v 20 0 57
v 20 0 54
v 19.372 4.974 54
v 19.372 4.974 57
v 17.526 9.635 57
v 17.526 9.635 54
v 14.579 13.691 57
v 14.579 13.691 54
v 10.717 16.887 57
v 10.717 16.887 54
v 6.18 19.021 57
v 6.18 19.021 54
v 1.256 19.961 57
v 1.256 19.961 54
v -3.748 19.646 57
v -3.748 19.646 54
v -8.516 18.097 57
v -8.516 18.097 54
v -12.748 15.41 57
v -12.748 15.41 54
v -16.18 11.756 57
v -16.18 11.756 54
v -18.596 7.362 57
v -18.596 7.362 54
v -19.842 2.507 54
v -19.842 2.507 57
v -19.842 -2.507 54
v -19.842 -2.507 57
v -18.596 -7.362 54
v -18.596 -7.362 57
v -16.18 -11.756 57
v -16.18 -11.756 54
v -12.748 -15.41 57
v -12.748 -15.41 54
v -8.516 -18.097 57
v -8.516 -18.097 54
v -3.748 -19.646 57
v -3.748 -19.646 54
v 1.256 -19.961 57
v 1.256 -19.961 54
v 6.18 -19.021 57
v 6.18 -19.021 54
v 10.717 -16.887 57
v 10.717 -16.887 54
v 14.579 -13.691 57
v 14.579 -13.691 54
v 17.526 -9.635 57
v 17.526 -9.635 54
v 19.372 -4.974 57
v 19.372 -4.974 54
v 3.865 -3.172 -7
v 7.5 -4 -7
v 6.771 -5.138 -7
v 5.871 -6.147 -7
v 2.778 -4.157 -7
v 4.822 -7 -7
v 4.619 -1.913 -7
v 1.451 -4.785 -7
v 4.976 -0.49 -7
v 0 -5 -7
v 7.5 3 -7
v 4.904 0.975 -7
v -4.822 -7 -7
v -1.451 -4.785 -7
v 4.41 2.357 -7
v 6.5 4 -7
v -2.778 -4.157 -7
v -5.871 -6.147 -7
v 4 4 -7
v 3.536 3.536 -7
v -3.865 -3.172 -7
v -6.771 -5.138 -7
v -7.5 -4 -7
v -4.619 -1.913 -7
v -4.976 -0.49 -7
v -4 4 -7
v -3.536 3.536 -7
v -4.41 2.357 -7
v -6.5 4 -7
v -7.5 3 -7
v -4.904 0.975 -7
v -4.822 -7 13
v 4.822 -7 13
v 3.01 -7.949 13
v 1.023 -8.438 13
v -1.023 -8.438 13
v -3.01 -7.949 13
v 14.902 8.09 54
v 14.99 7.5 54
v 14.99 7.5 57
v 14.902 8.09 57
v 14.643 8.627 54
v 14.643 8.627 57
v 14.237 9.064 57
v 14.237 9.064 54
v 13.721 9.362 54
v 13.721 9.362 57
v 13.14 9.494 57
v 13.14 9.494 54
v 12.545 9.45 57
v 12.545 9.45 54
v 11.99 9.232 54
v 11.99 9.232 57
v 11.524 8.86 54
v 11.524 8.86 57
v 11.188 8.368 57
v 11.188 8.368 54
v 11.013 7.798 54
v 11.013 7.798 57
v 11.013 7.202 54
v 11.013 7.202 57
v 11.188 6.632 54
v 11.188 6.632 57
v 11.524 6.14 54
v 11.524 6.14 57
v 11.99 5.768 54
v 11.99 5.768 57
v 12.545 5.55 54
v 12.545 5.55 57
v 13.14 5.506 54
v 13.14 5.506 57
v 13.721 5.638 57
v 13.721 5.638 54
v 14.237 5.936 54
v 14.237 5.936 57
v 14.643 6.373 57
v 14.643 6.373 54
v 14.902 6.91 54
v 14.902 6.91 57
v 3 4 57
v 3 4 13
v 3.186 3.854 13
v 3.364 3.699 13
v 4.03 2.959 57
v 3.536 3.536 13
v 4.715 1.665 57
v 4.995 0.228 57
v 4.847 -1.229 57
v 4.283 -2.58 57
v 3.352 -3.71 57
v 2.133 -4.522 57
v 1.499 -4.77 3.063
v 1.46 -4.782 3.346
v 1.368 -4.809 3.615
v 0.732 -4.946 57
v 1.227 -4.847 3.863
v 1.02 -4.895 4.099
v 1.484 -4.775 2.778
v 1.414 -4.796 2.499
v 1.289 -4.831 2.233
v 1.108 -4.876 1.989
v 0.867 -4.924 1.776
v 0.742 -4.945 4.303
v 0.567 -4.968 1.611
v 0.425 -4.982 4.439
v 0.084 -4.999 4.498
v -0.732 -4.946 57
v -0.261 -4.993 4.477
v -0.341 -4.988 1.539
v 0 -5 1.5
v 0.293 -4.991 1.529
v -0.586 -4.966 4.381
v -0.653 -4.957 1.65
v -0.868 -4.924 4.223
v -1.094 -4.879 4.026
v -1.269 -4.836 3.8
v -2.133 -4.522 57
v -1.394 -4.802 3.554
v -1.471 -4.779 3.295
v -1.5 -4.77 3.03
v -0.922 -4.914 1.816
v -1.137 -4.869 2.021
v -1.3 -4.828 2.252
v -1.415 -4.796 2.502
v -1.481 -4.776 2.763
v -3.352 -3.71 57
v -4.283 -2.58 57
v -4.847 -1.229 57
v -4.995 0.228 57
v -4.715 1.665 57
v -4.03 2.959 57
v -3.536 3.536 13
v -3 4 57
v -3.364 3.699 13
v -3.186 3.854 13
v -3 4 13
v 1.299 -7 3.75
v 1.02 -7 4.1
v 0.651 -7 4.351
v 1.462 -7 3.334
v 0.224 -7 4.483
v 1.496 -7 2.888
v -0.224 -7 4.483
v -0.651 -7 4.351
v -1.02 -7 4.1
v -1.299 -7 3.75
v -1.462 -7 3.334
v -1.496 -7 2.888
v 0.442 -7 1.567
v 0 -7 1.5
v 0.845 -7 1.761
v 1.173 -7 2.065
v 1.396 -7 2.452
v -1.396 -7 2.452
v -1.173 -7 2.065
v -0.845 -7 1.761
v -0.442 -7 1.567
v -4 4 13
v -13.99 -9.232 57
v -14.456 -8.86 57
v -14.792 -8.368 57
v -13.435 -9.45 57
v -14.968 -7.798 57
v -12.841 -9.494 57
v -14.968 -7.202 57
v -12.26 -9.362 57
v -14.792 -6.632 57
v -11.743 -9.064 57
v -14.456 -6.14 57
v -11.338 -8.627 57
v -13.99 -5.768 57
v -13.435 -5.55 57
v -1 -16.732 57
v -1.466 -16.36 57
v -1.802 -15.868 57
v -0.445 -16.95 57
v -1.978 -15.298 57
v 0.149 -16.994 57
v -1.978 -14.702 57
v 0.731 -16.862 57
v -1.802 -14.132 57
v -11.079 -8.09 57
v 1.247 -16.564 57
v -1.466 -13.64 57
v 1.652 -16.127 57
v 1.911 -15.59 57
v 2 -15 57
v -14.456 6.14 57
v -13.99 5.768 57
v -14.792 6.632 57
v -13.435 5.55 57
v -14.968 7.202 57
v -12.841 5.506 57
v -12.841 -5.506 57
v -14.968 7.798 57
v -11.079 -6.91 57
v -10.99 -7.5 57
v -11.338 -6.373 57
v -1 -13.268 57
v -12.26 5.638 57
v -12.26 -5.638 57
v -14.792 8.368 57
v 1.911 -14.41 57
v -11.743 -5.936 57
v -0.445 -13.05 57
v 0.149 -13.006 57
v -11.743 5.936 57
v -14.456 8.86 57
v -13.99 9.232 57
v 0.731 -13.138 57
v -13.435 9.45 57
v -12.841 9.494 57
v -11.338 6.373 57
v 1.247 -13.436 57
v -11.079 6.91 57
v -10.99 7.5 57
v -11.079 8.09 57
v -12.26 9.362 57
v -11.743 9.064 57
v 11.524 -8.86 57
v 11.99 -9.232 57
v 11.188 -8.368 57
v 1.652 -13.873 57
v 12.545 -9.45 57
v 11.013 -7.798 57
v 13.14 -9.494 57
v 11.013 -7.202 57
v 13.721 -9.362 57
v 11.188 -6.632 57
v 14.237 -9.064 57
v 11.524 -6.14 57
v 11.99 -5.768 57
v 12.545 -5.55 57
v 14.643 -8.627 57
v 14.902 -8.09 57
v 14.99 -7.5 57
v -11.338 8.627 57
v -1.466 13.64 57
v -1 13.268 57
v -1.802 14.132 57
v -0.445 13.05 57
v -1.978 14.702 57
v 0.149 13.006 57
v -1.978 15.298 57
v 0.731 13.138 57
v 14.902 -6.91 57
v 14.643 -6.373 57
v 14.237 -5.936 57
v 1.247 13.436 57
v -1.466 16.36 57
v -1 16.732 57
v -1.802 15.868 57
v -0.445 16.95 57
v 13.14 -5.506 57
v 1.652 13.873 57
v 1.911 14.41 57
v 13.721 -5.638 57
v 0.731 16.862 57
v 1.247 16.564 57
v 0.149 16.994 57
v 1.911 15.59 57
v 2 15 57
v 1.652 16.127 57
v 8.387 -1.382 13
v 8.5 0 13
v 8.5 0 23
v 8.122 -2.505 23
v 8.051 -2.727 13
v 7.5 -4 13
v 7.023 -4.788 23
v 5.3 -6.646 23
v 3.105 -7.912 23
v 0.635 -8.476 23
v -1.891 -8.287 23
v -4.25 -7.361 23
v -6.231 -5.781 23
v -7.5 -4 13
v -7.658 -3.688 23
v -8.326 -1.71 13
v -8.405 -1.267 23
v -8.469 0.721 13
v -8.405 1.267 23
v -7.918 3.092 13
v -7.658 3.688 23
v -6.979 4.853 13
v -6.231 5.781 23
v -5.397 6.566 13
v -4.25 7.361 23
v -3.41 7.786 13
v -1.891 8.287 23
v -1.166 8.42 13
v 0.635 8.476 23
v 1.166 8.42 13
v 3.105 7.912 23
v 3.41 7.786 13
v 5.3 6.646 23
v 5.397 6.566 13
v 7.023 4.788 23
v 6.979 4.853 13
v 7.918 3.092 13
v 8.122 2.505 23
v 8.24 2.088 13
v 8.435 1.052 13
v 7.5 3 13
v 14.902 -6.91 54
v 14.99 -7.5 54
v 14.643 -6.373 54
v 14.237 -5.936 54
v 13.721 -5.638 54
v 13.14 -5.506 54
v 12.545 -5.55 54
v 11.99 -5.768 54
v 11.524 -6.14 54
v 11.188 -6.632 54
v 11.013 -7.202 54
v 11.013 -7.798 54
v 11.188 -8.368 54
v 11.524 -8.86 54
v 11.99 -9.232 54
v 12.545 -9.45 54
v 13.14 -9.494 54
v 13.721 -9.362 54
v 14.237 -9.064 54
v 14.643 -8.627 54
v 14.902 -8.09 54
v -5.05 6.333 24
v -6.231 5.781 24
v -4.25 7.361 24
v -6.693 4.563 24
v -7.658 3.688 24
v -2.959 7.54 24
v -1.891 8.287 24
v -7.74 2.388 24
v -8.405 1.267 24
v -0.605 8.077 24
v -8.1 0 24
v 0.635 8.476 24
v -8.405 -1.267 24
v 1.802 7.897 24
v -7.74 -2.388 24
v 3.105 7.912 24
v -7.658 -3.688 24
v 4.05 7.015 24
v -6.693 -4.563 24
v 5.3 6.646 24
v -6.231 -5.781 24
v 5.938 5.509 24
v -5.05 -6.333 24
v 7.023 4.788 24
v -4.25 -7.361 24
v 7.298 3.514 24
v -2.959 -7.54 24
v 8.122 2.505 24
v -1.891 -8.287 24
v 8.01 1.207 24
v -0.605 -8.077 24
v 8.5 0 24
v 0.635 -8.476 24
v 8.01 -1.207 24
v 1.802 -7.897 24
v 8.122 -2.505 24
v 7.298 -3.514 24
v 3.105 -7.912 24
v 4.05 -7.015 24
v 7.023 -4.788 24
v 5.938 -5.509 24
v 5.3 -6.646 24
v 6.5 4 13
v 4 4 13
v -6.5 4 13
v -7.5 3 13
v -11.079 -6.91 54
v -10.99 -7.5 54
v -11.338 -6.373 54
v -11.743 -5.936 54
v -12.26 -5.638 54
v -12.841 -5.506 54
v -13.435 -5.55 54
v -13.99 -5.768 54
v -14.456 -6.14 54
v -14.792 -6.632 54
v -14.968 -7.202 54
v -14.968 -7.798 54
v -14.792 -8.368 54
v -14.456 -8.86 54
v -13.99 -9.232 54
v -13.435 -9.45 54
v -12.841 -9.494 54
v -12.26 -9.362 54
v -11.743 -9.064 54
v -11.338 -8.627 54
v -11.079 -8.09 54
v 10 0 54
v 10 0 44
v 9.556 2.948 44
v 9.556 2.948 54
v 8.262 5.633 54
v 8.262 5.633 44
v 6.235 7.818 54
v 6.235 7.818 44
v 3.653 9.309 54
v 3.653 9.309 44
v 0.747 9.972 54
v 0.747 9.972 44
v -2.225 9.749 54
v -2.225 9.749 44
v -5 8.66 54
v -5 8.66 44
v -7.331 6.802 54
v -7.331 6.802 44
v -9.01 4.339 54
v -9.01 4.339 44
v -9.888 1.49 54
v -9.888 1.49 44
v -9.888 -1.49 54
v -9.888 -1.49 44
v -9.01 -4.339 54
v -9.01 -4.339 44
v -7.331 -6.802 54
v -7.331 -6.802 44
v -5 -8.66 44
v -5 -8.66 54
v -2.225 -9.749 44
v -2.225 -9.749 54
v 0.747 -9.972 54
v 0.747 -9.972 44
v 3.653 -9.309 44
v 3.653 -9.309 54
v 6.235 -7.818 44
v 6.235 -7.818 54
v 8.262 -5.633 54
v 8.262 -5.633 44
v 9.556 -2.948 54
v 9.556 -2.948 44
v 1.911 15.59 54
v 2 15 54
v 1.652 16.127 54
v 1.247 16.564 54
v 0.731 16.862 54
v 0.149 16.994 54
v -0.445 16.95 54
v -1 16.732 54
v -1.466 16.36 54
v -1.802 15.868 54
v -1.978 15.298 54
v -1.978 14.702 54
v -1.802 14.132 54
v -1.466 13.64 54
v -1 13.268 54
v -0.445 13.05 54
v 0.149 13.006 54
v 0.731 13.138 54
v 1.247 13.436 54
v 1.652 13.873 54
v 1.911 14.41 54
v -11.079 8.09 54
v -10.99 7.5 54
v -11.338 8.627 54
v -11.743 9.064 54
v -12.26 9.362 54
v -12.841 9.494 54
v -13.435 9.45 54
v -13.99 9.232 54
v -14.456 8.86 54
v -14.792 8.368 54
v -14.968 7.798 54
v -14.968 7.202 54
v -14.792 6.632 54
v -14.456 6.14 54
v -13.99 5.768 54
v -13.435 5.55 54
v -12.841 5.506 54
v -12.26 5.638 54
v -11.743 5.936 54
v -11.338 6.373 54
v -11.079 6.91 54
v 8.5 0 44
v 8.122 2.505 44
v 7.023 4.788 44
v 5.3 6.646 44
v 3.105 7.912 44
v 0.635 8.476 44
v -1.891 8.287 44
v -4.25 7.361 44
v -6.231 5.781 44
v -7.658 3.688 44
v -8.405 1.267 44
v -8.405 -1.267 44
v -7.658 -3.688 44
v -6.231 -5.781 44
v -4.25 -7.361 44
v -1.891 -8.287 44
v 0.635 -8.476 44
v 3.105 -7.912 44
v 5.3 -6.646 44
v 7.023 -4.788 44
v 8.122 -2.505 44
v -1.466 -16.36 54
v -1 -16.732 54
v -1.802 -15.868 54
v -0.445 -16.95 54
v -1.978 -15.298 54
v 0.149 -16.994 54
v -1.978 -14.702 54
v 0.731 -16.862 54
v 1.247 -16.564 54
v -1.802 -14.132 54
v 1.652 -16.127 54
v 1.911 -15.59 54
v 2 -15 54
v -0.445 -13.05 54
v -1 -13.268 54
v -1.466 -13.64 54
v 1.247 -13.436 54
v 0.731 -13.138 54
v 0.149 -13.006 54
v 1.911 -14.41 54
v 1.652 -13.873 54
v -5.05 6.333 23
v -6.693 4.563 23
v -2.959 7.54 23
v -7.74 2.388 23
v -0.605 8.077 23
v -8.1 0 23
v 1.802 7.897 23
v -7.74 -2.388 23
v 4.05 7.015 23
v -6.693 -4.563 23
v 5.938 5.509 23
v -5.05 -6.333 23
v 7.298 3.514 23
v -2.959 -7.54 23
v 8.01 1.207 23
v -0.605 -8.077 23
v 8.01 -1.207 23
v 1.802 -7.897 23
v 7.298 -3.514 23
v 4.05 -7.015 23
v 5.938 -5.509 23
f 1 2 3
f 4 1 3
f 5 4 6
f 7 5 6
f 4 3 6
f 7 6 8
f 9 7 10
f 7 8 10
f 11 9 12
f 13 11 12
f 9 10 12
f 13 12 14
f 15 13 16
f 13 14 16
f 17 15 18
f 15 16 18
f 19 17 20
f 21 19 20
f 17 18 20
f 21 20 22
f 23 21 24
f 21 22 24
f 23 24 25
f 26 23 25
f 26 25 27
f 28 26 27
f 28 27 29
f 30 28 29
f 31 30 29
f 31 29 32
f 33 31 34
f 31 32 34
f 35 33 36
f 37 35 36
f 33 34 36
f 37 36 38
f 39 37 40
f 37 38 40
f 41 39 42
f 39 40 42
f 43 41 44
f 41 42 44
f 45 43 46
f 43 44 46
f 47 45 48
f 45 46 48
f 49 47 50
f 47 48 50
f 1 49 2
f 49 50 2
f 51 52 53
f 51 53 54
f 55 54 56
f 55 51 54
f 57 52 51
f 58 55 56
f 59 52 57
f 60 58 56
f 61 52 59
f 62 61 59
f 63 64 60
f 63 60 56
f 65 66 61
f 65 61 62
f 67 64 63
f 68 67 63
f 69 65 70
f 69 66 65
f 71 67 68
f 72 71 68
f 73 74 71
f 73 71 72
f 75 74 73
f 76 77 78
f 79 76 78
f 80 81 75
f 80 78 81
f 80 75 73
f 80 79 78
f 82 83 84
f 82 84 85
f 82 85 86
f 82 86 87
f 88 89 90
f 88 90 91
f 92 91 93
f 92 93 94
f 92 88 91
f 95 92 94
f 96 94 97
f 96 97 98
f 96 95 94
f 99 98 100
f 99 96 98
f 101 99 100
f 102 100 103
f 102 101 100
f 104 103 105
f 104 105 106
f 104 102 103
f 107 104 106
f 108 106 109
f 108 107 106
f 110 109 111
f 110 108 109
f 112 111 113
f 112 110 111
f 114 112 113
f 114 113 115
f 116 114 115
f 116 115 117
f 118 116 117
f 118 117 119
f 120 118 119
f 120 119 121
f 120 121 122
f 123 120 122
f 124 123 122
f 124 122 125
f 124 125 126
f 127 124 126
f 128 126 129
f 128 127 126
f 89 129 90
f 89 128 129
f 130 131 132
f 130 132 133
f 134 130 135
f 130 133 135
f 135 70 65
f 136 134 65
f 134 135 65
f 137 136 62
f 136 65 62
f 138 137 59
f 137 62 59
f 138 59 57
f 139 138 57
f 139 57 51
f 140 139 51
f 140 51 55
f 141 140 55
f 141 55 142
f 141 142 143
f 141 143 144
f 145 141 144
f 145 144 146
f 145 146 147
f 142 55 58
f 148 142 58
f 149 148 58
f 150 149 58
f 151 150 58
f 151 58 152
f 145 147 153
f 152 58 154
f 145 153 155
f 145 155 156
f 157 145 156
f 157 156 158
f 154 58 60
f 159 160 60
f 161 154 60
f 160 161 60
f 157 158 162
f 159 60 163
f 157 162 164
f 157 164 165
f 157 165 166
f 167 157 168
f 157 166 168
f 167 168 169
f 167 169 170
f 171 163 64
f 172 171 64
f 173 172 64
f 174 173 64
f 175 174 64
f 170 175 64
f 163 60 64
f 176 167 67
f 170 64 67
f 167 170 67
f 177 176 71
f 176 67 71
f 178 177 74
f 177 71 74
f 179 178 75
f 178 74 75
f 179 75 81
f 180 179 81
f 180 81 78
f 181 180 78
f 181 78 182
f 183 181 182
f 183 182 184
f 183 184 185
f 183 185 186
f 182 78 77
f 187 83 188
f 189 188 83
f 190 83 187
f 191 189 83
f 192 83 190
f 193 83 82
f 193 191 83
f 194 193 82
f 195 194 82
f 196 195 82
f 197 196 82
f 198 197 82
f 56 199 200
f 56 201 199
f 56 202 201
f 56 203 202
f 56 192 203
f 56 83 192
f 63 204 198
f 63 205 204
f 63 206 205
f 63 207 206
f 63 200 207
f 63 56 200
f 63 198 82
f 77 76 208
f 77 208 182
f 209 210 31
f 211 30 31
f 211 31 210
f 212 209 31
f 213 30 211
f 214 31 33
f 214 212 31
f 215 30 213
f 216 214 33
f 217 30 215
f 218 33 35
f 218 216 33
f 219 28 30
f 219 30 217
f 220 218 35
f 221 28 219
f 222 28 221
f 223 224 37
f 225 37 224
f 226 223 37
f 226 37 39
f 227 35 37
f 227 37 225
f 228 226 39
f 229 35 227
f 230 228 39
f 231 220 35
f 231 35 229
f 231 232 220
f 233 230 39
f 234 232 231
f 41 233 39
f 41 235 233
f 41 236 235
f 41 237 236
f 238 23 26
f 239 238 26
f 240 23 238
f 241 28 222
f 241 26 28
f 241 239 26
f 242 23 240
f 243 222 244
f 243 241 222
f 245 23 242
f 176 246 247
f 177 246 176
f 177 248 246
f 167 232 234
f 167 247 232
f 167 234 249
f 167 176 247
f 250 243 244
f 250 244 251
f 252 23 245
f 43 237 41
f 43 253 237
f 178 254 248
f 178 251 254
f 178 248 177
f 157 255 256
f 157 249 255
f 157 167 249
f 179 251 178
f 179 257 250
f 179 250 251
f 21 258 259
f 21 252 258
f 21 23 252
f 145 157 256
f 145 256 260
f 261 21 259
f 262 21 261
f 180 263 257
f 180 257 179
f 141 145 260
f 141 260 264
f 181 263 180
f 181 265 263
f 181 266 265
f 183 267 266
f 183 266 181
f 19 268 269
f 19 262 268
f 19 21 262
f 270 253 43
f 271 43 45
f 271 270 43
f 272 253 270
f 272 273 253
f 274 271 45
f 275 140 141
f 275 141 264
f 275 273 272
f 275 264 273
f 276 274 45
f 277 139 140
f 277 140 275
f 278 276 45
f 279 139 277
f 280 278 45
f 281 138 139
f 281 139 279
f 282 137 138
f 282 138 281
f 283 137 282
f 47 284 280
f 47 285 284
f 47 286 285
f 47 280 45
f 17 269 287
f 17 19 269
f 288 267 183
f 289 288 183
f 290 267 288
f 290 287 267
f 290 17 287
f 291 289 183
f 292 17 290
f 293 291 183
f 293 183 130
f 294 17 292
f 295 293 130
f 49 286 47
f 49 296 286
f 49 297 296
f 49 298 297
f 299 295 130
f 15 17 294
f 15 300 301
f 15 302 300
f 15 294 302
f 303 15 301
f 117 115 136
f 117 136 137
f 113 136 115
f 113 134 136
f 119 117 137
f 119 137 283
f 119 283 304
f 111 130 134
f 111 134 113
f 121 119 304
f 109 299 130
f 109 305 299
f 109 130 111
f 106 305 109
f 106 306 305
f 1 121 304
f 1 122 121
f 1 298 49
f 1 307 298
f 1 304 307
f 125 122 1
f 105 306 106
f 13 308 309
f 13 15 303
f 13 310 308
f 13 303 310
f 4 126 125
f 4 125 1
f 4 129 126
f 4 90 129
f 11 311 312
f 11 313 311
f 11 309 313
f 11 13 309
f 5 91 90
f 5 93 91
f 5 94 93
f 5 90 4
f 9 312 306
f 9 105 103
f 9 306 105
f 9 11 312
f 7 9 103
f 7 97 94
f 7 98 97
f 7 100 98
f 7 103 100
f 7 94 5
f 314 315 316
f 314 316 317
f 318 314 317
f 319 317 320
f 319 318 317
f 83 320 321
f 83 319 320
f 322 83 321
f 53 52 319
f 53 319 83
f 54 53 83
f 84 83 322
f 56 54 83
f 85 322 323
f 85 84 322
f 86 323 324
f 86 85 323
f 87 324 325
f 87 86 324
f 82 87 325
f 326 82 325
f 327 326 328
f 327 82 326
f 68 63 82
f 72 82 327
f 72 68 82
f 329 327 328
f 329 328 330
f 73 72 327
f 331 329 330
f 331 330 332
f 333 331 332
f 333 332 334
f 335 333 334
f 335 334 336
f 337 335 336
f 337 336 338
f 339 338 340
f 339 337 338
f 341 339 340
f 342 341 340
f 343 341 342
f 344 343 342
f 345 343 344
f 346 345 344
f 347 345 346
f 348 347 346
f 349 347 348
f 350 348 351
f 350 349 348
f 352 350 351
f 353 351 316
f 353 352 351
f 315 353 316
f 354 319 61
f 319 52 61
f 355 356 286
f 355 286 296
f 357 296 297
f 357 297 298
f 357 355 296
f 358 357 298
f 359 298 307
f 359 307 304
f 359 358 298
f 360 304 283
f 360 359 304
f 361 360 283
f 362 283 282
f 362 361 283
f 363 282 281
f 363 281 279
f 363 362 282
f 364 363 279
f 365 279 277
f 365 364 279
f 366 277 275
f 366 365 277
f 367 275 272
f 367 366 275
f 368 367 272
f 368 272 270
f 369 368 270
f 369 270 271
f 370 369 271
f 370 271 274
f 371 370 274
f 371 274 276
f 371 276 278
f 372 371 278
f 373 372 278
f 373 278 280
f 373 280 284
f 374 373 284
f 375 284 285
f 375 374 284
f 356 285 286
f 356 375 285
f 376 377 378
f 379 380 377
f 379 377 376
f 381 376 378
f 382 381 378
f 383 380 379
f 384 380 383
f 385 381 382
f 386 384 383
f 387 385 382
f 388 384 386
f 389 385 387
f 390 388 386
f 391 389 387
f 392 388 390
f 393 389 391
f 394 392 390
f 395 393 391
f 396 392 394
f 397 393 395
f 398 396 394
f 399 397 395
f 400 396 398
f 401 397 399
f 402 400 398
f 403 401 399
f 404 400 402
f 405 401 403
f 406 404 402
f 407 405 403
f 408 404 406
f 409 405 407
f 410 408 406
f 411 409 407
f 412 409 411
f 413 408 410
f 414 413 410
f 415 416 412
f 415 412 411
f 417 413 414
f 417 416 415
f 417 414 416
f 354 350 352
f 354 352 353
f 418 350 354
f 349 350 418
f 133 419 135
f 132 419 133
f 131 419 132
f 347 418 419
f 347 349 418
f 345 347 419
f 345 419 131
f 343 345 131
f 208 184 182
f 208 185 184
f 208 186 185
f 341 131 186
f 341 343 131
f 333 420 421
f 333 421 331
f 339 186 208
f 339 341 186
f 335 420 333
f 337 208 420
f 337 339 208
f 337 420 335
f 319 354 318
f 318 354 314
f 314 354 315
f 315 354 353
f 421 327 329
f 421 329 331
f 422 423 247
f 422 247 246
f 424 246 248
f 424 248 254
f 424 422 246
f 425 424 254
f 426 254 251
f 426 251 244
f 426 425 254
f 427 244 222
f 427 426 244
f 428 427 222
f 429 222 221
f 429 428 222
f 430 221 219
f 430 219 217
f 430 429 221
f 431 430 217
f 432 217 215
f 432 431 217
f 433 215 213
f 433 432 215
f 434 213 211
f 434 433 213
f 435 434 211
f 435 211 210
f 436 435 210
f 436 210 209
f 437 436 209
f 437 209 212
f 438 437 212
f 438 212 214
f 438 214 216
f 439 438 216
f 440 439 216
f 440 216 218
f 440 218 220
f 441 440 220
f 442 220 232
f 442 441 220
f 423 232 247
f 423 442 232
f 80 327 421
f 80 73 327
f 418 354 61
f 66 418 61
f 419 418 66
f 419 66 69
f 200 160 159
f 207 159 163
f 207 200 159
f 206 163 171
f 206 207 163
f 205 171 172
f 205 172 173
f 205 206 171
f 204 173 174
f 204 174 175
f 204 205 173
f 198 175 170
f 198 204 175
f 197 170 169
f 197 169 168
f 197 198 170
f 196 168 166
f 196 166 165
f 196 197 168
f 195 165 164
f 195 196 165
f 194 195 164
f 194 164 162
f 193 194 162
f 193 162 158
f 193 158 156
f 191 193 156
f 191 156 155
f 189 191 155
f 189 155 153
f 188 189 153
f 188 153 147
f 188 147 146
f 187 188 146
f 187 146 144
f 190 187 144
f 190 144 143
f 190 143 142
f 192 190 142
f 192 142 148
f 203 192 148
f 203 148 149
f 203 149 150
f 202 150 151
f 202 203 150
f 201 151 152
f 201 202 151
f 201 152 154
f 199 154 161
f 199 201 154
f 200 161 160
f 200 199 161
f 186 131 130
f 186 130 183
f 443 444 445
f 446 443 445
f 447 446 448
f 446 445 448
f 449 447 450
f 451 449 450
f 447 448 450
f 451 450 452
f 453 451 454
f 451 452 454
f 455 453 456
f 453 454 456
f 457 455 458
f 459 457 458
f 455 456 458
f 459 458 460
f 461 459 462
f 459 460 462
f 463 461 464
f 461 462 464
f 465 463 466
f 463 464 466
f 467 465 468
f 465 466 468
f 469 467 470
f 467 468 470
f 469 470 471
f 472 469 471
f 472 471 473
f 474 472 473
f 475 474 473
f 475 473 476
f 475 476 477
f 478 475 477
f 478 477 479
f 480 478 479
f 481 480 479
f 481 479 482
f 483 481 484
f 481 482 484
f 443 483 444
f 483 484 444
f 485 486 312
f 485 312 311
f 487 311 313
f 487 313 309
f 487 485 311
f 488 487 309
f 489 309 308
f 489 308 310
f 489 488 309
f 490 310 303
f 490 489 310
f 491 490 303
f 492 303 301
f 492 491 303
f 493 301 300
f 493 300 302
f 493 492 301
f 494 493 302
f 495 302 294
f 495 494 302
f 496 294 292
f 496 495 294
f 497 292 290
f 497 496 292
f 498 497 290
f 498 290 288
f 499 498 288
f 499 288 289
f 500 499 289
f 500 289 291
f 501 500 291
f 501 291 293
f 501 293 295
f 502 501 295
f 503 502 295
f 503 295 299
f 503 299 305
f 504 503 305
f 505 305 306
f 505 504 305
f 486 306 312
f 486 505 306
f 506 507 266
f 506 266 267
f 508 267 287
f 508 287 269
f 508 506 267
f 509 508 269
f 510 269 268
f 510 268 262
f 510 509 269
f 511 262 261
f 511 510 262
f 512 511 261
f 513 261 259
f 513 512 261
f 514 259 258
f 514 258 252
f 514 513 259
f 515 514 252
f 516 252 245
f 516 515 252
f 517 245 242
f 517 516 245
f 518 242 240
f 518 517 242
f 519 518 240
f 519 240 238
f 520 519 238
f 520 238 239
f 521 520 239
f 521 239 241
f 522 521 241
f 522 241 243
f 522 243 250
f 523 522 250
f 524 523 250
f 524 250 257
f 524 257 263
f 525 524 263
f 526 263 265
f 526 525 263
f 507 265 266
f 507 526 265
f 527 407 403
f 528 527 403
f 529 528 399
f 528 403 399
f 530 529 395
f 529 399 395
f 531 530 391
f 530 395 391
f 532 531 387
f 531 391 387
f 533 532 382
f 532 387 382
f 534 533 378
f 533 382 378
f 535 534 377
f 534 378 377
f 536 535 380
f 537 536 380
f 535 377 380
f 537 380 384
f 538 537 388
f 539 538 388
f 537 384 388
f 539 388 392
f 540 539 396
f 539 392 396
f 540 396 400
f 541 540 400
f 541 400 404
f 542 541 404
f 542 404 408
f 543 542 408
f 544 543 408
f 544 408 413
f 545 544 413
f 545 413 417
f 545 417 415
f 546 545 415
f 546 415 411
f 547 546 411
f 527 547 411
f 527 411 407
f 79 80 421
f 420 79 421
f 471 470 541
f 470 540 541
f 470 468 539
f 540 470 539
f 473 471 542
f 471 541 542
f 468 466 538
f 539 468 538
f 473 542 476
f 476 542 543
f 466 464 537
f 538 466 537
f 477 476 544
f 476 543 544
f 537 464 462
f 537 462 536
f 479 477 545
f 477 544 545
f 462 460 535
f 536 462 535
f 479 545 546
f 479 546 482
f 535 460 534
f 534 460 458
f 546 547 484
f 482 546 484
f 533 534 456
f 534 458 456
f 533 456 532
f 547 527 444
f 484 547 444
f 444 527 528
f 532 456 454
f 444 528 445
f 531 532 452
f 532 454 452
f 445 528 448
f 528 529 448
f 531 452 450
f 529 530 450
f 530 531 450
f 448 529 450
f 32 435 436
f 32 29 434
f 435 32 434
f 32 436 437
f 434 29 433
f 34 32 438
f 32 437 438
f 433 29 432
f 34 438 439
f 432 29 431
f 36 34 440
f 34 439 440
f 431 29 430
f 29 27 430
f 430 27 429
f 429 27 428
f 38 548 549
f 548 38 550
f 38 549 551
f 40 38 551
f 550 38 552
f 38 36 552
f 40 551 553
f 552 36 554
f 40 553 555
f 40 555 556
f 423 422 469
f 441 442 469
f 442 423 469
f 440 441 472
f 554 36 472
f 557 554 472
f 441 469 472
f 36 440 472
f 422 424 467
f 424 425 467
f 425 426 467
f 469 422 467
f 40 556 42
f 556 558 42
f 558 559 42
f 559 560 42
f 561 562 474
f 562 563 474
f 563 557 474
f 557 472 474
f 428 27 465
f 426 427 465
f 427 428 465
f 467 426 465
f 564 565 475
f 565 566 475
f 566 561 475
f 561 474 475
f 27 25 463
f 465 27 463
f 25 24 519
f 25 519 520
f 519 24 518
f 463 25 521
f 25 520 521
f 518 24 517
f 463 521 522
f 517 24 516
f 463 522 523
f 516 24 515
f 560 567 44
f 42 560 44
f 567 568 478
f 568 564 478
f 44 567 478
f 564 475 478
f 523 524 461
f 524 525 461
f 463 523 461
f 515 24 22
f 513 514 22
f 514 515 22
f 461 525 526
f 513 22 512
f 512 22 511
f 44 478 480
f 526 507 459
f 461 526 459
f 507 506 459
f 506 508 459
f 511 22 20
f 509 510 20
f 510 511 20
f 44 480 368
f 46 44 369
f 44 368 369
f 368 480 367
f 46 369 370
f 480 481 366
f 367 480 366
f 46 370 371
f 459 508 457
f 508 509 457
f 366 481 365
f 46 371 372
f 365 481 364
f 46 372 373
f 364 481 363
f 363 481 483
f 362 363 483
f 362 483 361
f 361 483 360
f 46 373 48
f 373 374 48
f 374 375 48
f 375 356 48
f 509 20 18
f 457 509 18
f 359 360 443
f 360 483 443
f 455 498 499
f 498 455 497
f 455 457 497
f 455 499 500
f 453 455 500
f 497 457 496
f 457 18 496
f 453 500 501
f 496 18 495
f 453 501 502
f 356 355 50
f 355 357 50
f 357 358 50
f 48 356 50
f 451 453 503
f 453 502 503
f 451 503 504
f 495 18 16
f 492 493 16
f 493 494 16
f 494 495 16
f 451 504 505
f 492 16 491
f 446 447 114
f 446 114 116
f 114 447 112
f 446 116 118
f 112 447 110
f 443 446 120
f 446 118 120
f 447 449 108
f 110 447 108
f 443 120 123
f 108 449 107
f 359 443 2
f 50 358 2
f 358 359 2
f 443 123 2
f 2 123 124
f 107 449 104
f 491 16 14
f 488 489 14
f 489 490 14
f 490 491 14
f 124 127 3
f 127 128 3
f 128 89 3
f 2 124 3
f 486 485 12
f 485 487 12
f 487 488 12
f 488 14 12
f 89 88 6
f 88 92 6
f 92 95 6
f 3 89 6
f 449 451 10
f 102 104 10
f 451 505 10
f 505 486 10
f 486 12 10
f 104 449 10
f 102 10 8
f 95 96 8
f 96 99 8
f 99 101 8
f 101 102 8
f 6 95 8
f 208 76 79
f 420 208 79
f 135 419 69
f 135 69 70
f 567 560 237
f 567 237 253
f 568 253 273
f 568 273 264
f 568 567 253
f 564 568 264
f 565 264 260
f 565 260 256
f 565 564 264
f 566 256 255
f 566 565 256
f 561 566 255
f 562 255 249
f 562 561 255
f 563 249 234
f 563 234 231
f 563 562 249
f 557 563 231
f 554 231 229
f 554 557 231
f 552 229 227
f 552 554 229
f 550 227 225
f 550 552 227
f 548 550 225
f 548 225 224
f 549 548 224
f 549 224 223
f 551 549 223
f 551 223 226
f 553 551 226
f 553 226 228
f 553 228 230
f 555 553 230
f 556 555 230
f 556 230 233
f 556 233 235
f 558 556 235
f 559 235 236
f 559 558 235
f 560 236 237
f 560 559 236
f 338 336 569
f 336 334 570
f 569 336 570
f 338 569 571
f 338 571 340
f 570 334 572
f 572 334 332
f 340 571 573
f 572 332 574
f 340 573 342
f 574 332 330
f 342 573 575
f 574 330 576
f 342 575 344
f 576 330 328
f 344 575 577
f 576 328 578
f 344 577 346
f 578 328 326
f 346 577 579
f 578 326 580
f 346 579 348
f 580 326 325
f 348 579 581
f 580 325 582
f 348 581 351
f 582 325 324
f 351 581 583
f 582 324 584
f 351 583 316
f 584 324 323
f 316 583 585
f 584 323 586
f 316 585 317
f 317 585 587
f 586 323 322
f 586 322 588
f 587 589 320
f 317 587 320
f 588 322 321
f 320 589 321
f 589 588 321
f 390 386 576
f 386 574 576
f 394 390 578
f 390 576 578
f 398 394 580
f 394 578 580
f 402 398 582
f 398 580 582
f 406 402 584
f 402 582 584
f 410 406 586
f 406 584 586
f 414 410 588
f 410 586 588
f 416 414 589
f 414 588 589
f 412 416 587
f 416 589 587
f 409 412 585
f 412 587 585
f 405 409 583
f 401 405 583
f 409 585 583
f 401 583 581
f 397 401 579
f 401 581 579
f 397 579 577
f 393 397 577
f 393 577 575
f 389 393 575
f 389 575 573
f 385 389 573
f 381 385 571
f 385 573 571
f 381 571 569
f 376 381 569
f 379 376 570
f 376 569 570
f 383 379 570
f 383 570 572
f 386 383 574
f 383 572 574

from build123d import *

# Parameters (mm, degrees)
SKETCH_1_R               = 8.5
EXTRUDE_1_DEPTH          = 33
SKETCH_2_R               = 8.5
EXTRUDE_2_DEPTH          = 11
SKETCH_3_R               = 10
EXTRUDE_3_DEPTH          = 10
CHAMFER_2_SIZE           = 0.5
SKETCH_12_W              = 1
SKETCH_12_H              = 0.4
SKETCH_13_R              = 5
CUT_EXTRUDE_1_DEPTH      = 20
EXTRUDE_START            = 7.5
SKETCH_19_R              = 8.5
EXTRUDE_6_DEPTH          = 7.5
SKETCH_20_R              = 5
CUT_EXTRUDE_5_DEPTH      = 7.5
CUT_EXTRUDE_6_DEPTH      = 16.5
CUT_EXTRUDE_6_DEPTH_BACK = 16.5
SKETCH_21_R              = 1.5
SKETCH_14_R              = 20
SKETCH_14_R_2            = 2
EXTRUDE_7_DEPTH          = 3
EXTRUDE_START_2          = 7
SKETCH_23_R              = 5
EXTRUDE_8_DEPTH          = 7
CUT_EXTRUDE_START        = -44
SKETCH_24_R              = 5
CUT_EXTRUDE_7_DEPTH      = 44
SKETCH_31_R              = 7
SKETCH_31_R_2            = 5
EXTRUDE_10_DEPTH         = 20
EXTRUDE_11_DEPTH         = 84
SKETCH_33_R              = 1.5
CUT_EXTRUDE_8_DEPTH      = 26
EXTRUDE_START_3          = -3
SKETCH_35_R              = 13
SKETCH_35_R_2            = 7
EXTRUDE_12_DEPTH         = 3
SKETCH_36_R              = 1.5
CUT_EXTRUDE_10_DEPTH     = 3
CUT_EXTRUDE_START_2      = -20
SKETCH_38_R              = 20
CUT_EXTRUDE_12_DEPTH     = 20
SKETCH_39_W              = 15
SKETCH_39_H              = 6.010679791
CUT_EXTRUDE_13_DEPTH     = 20
SKETCH_40_W              = 3.690554248
SKETCH_40_H              = 8
SKETCH_40_W_2            = 3.213479815
CUT_EXTRUDE_14_DEPTH     = 20
SKETCH_42_W              = 19.43068456
SKETCH_42_H              = 3.441553847
CUT_EXTRUDE_16_DEPTH     = 20
CHAMFER_5_SIZE           = 1
CHAMFER_6_SIZE           = 1


with BuildPart() as part:
    # 草图1 → 凸台-拉伸1 (new body)
    with BuildSketch(Plane.XY):
        Circle(SKETCH_1_R)
    extrude(amount=EXTRUDE_1_DEPTH)

    # 草图2 → 凸台-拉伸2 (add)
    with BuildSketch(Plane.XY.offset(33)):
        Circle(SKETCH_2_R)
    extrude(amount=EXTRUDE_2_DEPTH)

    # 草图3 → 凸台-拉伸3 (add)
    with BuildSketch(Plane.XY.offset(44)):
        Circle(SKETCH_3_R)
    extrude(amount=EXTRUDE_3_DEPTH)

    # 倒角2
    chamfer_2_edges = [part.edges().sort_by_distance(p)[0] for p in [
        (-8.5, 0, 0),
    ]]
    chamfer(chamfer_2_edges, length=CHAMFER_2_SIZE)

    # 草图12 → 切除-旋转1 (revolve, cut)
    with BuildSketch(Plane(origin=(0, 0, 0), x_dir=(0, 0, -1), z_dir=(1, 0, 0)), mode=Mode.PRIVATE) as cut_revolve_1_sk:
        with Locations((-23.5, 8.3)):
            Rectangle(SKETCH_12_W, SKETCH_12_H)
    revolve(cut_revolve_1_sk.sketch.rotate(Axis((0, 0, 0), (0, 0, 1)), 90), axis=Axis((0, 0, 0), (0, 0, 1)), mode=Mode.SUBTRACT)

    # 草图13 → 切除-拉伸1 (cut)
    with BuildSketch(Plane(origin=(0, 0, 0), x_dir=(-1, 0, 0), z_dir=(0, 0, -1))):
        Circle(SKETCH_13_R)
    extrude(amount=-CUT_EXTRUDE_1_DEPTH, mode=Mode.SUBTRACT)

    # 草图19 → 凸台-拉伸6 (add)
    with BuildSketch(Plane(origin=(0, 0, 0.5), x_dir=(-1, 0, 0), z_dir=(0, 0, -1)).offset(EXTRUDE_START)):
        Circle(SKETCH_19_R)
    extrude(amount=-EXTRUDE_6_DEPTH)

    # 草图20 → 切除-拉伸5 (cut)
    with BuildSketch(Plane(origin=(0, 0, -7), x_dir=(-1, 0, 0), z_dir=(0, 0, -1))):
        Circle(SKETCH_20_R)
    extrude(amount=-CUT_EXTRUDE_5_DEPTH, mode=Mode.SUBTRACT)

    # 草图21 → 切除-拉伸6 (cut, two sides: drawn at the far end of the back side and taken through both)
    with BuildSketch(Plane(origin=(0, 0, 0), x_dir=(1, 0, 0), z_dir=(0, 1, 0)).offset(-CUT_EXTRUDE_6_DEPTH_BACK)):
        with Locations(Location((0, -3, 0), (0, 0, 90))):
            Circle(SKETCH_21_R)
    extrude(amount=CUT_EXTRUDE_6_DEPTH + CUT_EXTRUDE_6_DEPTH_BACK, mode=Mode.SUBTRACT)

    # 草图14 → 凸台-拉伸7 (add)
    with BuildSketch(Plane.XY.offset(54)):
        Circle(SKETCH_14_R)
        with Locations((0, 15)):
            Circle(SKETCH_14_R_2, mode=Mode.SUBTRACT)
        with Locations((12.990381057, 7.5)):
            Circle(SKETCH_14_R_2, mode=Mode.SUBTRACT)
        with Locations((12.990381057, -7.5)):
            Circle(SKETCH_14_R_2, mode=Mode.SUBTRACT)
        with Locations((0, -15)):
            Circle(SKETCH_14_R_2, mode=Mode.SUBTRACT)
        with Locations((-12.990381057, -7.5)):
            Circle(SKETCH_14_R_2, mode=Mode.SUBTRACT)
        with Locations((-12.990381057, 7.5)):
            Circle(SKETCH_14_R_2, mode=Mode.SUBTRACT)
    extrude(amount=EXTRUDE_7_DEPTH)

    # 草图23 → 凸台-拉伸8 (add)
    with BuildSketch(Plane(origin=(0, 0, 20), x_dir=(-1, 0, 0), z_dir=(0, 0, -1)).offset(EXTRUDE_START_2)):
        Circle(SKETCH_23_R)
    extrude(amount=-EXTRUDE_8_DEPTH)

    # 草图24 → 切除-拉伸7 (cut)
    with BuildSketch(Plane.XY.offset(57).offset(CUT_EXTRUDE_START)):
        with Locations(Location((0, 0, 0), (0, 0, 180))):
            Circle(SKETCH_24_R)
    extrude(amount=CUT_EXTRUDE_7_DEPTH, mode=Mode.SUBTRACT)

    # 草图31 → 凸台-拉伸10 (add)
    with BuildSketch(Plane.XY.offset(57)):
        Circle(SKETCH_31_R)
        with Locations(Location((0, 0, 0), (0, 0, 180))):
            Circle(SKETCH_31_R_2, mode=Mode.SUBTRACT)
    extrude(amount=EXTRUDE_10_DEPTH)

    # 草图32 → 凸台-拉伸11 (add)
    with BuildSketch(Plane(origin=(0, 0, -7), x_dir=(-1, 0, 0), z_dir=(0, 0, -1))):
        with BuildLine():
            Line((-3, 4), (3, 4))
            ThreePointArc((3, 4), (0, 5), (-3, 4))
        make_face()
    extrude(amount=-EXTRUDE_11_DEPTH)

    # 草图33 → 切除-拉伸8 (cut)
    with BuildSketch(Plane.XZ.offset(-4)):
        with Locations(Location((0, 3, 0), (0, 0, 270))):
            Circle(SKETCH_33_R)
    extrude(amount=-CUT_EXTRUDE_8_DEPTH, mode=Mode.SUBTRACT)

    # 草图35 → 凸台-拉伸12 (add)
    with BuildSketch(Plane.XY.offset(74).offset(EXTRUDE_START_3)):
        Circle(SKETCH_35_R)
        Circle(SKETCH_35_R_2, mode=Mode.SUBTRACT)
    extrude(amount=EXTRUDE_12_DEPTH)

    # 草图36 → 切除-拉伸10 (cut)
    with BuildSketch(Plane.XY.offset(74)):
        with Locations((0, 10)):
            Circle(SKETCH_36_R)
        with Locations((8.660254038, 5)):
            Circle(SKETCH_36_R)
        with Locations((8.660254038, -5)):
            Circle(SKETCH_36_R)
        with Locations((0, -10)):
            Circle(SKETCH_36_R)
        with Locations((-8.660254038, -5)):
            Circle(SKETCH_36_R)
        with Locations((-8.660254038, 5)):
            Circle(SKETCH_36_R)
    extrude(amount=-CUT_EXTRUDE_10_DEPTH, mode=Mode.SUBTRACT)

    # 草图38 → 切除-拉伸12 (cut)
    with BuildSketch(Plane.XY.offset(77).offset(CUT_EXTRUDE_START_2)):
        Circle(SKETCH_38_R)
    extrude(amount=CUT_EXTRUDE_12_DEPTH, mode=Mode.SUBTRACT)

    # 草图39 → 切除-拉伸13 (cut)
    with BuildSketch(Plane(origin=(0, 0, -7), x_dir=(-1, 0, 0), z_dir=(0, 0, -1))):
        with Locations((0, 7.005339896)):
            Rectangle(SKETCH_39_W, SKETCH_39_H)
    extrude(amount=-CUT_EXTRUDE_13_DEPTH, mode=Mode.SUBTRACT)

    # 草图40 → 切除-拉伸14 (cut)
    with BuildSketch(Plane(origin=(0, 0, -7), x_dir=(-1, 0, 0), z_dir=(0, 0, -1))):
        with Locations((-9.345277124, 0)):
            Rectangle(SKETCH_40_W, SKETCH_40_H)
        with Locations((9.106739908, 0)):
            Rectangle(SKETCH_40_W_2, SKETCH_40_H)
    extrude(amount=-CUT_EXTRUDE_14_DEPTH, mode=Mode.SUBTRACT)

    # 草图42 → 切除-拉伸16 (cut)
    with BuildSketch(Plane(origin=(0, 0, -7), x_dir=(-1, 0, 0), z_dir=(0, 0, -1))):
        with Locations((-0.246054433, -8.720776924)):
            Rectangle(SKETCH_42_W, SKETCH_42_H)
    extrude(amount=-CUT_EXTRUDE_16_DEPTH, mode=Mode.SUBTRACT)

    # 倒角5
    chamfer_5_edges = [part.edges().sort_by_distance(p)[0] for p in [
        (-7.5, 4, 3),
        (7.5, 4, 3),
    ]]
    chamfer(chamfer_5_edges, length=CHAMFER_5_SIZE)

    # 倒角6
    # the kernel refuses this chamfer: 1, 0.714285714 mm, written as the material it takes off along each edge
    with BuildSketch(Plane(origin=(-3, 4, -9.571682988), x_dir=(-1, 0, 0), z_dir=(0, 0, 1)), Plane(origin=(3, 4, 13), x_dir=(1, 0, 0), z_dir=(0, 0, -1))) as chamfer_6_piece_1:
        with BuildLine():
            Line((CHAMFER_6_SIZE, 0), (0.535533906, 0.464466094))
            ThreePointArc((0.535533906, 0.464466094), (0.274930492, 0.221795364), (0, 0))
            Line((0, 0), (CHAMFER_6_SIZE, 0))
        make_face()
    extrude(amount=22.571682988, mode=Mode.SUBTRACT)


solid = part.part
